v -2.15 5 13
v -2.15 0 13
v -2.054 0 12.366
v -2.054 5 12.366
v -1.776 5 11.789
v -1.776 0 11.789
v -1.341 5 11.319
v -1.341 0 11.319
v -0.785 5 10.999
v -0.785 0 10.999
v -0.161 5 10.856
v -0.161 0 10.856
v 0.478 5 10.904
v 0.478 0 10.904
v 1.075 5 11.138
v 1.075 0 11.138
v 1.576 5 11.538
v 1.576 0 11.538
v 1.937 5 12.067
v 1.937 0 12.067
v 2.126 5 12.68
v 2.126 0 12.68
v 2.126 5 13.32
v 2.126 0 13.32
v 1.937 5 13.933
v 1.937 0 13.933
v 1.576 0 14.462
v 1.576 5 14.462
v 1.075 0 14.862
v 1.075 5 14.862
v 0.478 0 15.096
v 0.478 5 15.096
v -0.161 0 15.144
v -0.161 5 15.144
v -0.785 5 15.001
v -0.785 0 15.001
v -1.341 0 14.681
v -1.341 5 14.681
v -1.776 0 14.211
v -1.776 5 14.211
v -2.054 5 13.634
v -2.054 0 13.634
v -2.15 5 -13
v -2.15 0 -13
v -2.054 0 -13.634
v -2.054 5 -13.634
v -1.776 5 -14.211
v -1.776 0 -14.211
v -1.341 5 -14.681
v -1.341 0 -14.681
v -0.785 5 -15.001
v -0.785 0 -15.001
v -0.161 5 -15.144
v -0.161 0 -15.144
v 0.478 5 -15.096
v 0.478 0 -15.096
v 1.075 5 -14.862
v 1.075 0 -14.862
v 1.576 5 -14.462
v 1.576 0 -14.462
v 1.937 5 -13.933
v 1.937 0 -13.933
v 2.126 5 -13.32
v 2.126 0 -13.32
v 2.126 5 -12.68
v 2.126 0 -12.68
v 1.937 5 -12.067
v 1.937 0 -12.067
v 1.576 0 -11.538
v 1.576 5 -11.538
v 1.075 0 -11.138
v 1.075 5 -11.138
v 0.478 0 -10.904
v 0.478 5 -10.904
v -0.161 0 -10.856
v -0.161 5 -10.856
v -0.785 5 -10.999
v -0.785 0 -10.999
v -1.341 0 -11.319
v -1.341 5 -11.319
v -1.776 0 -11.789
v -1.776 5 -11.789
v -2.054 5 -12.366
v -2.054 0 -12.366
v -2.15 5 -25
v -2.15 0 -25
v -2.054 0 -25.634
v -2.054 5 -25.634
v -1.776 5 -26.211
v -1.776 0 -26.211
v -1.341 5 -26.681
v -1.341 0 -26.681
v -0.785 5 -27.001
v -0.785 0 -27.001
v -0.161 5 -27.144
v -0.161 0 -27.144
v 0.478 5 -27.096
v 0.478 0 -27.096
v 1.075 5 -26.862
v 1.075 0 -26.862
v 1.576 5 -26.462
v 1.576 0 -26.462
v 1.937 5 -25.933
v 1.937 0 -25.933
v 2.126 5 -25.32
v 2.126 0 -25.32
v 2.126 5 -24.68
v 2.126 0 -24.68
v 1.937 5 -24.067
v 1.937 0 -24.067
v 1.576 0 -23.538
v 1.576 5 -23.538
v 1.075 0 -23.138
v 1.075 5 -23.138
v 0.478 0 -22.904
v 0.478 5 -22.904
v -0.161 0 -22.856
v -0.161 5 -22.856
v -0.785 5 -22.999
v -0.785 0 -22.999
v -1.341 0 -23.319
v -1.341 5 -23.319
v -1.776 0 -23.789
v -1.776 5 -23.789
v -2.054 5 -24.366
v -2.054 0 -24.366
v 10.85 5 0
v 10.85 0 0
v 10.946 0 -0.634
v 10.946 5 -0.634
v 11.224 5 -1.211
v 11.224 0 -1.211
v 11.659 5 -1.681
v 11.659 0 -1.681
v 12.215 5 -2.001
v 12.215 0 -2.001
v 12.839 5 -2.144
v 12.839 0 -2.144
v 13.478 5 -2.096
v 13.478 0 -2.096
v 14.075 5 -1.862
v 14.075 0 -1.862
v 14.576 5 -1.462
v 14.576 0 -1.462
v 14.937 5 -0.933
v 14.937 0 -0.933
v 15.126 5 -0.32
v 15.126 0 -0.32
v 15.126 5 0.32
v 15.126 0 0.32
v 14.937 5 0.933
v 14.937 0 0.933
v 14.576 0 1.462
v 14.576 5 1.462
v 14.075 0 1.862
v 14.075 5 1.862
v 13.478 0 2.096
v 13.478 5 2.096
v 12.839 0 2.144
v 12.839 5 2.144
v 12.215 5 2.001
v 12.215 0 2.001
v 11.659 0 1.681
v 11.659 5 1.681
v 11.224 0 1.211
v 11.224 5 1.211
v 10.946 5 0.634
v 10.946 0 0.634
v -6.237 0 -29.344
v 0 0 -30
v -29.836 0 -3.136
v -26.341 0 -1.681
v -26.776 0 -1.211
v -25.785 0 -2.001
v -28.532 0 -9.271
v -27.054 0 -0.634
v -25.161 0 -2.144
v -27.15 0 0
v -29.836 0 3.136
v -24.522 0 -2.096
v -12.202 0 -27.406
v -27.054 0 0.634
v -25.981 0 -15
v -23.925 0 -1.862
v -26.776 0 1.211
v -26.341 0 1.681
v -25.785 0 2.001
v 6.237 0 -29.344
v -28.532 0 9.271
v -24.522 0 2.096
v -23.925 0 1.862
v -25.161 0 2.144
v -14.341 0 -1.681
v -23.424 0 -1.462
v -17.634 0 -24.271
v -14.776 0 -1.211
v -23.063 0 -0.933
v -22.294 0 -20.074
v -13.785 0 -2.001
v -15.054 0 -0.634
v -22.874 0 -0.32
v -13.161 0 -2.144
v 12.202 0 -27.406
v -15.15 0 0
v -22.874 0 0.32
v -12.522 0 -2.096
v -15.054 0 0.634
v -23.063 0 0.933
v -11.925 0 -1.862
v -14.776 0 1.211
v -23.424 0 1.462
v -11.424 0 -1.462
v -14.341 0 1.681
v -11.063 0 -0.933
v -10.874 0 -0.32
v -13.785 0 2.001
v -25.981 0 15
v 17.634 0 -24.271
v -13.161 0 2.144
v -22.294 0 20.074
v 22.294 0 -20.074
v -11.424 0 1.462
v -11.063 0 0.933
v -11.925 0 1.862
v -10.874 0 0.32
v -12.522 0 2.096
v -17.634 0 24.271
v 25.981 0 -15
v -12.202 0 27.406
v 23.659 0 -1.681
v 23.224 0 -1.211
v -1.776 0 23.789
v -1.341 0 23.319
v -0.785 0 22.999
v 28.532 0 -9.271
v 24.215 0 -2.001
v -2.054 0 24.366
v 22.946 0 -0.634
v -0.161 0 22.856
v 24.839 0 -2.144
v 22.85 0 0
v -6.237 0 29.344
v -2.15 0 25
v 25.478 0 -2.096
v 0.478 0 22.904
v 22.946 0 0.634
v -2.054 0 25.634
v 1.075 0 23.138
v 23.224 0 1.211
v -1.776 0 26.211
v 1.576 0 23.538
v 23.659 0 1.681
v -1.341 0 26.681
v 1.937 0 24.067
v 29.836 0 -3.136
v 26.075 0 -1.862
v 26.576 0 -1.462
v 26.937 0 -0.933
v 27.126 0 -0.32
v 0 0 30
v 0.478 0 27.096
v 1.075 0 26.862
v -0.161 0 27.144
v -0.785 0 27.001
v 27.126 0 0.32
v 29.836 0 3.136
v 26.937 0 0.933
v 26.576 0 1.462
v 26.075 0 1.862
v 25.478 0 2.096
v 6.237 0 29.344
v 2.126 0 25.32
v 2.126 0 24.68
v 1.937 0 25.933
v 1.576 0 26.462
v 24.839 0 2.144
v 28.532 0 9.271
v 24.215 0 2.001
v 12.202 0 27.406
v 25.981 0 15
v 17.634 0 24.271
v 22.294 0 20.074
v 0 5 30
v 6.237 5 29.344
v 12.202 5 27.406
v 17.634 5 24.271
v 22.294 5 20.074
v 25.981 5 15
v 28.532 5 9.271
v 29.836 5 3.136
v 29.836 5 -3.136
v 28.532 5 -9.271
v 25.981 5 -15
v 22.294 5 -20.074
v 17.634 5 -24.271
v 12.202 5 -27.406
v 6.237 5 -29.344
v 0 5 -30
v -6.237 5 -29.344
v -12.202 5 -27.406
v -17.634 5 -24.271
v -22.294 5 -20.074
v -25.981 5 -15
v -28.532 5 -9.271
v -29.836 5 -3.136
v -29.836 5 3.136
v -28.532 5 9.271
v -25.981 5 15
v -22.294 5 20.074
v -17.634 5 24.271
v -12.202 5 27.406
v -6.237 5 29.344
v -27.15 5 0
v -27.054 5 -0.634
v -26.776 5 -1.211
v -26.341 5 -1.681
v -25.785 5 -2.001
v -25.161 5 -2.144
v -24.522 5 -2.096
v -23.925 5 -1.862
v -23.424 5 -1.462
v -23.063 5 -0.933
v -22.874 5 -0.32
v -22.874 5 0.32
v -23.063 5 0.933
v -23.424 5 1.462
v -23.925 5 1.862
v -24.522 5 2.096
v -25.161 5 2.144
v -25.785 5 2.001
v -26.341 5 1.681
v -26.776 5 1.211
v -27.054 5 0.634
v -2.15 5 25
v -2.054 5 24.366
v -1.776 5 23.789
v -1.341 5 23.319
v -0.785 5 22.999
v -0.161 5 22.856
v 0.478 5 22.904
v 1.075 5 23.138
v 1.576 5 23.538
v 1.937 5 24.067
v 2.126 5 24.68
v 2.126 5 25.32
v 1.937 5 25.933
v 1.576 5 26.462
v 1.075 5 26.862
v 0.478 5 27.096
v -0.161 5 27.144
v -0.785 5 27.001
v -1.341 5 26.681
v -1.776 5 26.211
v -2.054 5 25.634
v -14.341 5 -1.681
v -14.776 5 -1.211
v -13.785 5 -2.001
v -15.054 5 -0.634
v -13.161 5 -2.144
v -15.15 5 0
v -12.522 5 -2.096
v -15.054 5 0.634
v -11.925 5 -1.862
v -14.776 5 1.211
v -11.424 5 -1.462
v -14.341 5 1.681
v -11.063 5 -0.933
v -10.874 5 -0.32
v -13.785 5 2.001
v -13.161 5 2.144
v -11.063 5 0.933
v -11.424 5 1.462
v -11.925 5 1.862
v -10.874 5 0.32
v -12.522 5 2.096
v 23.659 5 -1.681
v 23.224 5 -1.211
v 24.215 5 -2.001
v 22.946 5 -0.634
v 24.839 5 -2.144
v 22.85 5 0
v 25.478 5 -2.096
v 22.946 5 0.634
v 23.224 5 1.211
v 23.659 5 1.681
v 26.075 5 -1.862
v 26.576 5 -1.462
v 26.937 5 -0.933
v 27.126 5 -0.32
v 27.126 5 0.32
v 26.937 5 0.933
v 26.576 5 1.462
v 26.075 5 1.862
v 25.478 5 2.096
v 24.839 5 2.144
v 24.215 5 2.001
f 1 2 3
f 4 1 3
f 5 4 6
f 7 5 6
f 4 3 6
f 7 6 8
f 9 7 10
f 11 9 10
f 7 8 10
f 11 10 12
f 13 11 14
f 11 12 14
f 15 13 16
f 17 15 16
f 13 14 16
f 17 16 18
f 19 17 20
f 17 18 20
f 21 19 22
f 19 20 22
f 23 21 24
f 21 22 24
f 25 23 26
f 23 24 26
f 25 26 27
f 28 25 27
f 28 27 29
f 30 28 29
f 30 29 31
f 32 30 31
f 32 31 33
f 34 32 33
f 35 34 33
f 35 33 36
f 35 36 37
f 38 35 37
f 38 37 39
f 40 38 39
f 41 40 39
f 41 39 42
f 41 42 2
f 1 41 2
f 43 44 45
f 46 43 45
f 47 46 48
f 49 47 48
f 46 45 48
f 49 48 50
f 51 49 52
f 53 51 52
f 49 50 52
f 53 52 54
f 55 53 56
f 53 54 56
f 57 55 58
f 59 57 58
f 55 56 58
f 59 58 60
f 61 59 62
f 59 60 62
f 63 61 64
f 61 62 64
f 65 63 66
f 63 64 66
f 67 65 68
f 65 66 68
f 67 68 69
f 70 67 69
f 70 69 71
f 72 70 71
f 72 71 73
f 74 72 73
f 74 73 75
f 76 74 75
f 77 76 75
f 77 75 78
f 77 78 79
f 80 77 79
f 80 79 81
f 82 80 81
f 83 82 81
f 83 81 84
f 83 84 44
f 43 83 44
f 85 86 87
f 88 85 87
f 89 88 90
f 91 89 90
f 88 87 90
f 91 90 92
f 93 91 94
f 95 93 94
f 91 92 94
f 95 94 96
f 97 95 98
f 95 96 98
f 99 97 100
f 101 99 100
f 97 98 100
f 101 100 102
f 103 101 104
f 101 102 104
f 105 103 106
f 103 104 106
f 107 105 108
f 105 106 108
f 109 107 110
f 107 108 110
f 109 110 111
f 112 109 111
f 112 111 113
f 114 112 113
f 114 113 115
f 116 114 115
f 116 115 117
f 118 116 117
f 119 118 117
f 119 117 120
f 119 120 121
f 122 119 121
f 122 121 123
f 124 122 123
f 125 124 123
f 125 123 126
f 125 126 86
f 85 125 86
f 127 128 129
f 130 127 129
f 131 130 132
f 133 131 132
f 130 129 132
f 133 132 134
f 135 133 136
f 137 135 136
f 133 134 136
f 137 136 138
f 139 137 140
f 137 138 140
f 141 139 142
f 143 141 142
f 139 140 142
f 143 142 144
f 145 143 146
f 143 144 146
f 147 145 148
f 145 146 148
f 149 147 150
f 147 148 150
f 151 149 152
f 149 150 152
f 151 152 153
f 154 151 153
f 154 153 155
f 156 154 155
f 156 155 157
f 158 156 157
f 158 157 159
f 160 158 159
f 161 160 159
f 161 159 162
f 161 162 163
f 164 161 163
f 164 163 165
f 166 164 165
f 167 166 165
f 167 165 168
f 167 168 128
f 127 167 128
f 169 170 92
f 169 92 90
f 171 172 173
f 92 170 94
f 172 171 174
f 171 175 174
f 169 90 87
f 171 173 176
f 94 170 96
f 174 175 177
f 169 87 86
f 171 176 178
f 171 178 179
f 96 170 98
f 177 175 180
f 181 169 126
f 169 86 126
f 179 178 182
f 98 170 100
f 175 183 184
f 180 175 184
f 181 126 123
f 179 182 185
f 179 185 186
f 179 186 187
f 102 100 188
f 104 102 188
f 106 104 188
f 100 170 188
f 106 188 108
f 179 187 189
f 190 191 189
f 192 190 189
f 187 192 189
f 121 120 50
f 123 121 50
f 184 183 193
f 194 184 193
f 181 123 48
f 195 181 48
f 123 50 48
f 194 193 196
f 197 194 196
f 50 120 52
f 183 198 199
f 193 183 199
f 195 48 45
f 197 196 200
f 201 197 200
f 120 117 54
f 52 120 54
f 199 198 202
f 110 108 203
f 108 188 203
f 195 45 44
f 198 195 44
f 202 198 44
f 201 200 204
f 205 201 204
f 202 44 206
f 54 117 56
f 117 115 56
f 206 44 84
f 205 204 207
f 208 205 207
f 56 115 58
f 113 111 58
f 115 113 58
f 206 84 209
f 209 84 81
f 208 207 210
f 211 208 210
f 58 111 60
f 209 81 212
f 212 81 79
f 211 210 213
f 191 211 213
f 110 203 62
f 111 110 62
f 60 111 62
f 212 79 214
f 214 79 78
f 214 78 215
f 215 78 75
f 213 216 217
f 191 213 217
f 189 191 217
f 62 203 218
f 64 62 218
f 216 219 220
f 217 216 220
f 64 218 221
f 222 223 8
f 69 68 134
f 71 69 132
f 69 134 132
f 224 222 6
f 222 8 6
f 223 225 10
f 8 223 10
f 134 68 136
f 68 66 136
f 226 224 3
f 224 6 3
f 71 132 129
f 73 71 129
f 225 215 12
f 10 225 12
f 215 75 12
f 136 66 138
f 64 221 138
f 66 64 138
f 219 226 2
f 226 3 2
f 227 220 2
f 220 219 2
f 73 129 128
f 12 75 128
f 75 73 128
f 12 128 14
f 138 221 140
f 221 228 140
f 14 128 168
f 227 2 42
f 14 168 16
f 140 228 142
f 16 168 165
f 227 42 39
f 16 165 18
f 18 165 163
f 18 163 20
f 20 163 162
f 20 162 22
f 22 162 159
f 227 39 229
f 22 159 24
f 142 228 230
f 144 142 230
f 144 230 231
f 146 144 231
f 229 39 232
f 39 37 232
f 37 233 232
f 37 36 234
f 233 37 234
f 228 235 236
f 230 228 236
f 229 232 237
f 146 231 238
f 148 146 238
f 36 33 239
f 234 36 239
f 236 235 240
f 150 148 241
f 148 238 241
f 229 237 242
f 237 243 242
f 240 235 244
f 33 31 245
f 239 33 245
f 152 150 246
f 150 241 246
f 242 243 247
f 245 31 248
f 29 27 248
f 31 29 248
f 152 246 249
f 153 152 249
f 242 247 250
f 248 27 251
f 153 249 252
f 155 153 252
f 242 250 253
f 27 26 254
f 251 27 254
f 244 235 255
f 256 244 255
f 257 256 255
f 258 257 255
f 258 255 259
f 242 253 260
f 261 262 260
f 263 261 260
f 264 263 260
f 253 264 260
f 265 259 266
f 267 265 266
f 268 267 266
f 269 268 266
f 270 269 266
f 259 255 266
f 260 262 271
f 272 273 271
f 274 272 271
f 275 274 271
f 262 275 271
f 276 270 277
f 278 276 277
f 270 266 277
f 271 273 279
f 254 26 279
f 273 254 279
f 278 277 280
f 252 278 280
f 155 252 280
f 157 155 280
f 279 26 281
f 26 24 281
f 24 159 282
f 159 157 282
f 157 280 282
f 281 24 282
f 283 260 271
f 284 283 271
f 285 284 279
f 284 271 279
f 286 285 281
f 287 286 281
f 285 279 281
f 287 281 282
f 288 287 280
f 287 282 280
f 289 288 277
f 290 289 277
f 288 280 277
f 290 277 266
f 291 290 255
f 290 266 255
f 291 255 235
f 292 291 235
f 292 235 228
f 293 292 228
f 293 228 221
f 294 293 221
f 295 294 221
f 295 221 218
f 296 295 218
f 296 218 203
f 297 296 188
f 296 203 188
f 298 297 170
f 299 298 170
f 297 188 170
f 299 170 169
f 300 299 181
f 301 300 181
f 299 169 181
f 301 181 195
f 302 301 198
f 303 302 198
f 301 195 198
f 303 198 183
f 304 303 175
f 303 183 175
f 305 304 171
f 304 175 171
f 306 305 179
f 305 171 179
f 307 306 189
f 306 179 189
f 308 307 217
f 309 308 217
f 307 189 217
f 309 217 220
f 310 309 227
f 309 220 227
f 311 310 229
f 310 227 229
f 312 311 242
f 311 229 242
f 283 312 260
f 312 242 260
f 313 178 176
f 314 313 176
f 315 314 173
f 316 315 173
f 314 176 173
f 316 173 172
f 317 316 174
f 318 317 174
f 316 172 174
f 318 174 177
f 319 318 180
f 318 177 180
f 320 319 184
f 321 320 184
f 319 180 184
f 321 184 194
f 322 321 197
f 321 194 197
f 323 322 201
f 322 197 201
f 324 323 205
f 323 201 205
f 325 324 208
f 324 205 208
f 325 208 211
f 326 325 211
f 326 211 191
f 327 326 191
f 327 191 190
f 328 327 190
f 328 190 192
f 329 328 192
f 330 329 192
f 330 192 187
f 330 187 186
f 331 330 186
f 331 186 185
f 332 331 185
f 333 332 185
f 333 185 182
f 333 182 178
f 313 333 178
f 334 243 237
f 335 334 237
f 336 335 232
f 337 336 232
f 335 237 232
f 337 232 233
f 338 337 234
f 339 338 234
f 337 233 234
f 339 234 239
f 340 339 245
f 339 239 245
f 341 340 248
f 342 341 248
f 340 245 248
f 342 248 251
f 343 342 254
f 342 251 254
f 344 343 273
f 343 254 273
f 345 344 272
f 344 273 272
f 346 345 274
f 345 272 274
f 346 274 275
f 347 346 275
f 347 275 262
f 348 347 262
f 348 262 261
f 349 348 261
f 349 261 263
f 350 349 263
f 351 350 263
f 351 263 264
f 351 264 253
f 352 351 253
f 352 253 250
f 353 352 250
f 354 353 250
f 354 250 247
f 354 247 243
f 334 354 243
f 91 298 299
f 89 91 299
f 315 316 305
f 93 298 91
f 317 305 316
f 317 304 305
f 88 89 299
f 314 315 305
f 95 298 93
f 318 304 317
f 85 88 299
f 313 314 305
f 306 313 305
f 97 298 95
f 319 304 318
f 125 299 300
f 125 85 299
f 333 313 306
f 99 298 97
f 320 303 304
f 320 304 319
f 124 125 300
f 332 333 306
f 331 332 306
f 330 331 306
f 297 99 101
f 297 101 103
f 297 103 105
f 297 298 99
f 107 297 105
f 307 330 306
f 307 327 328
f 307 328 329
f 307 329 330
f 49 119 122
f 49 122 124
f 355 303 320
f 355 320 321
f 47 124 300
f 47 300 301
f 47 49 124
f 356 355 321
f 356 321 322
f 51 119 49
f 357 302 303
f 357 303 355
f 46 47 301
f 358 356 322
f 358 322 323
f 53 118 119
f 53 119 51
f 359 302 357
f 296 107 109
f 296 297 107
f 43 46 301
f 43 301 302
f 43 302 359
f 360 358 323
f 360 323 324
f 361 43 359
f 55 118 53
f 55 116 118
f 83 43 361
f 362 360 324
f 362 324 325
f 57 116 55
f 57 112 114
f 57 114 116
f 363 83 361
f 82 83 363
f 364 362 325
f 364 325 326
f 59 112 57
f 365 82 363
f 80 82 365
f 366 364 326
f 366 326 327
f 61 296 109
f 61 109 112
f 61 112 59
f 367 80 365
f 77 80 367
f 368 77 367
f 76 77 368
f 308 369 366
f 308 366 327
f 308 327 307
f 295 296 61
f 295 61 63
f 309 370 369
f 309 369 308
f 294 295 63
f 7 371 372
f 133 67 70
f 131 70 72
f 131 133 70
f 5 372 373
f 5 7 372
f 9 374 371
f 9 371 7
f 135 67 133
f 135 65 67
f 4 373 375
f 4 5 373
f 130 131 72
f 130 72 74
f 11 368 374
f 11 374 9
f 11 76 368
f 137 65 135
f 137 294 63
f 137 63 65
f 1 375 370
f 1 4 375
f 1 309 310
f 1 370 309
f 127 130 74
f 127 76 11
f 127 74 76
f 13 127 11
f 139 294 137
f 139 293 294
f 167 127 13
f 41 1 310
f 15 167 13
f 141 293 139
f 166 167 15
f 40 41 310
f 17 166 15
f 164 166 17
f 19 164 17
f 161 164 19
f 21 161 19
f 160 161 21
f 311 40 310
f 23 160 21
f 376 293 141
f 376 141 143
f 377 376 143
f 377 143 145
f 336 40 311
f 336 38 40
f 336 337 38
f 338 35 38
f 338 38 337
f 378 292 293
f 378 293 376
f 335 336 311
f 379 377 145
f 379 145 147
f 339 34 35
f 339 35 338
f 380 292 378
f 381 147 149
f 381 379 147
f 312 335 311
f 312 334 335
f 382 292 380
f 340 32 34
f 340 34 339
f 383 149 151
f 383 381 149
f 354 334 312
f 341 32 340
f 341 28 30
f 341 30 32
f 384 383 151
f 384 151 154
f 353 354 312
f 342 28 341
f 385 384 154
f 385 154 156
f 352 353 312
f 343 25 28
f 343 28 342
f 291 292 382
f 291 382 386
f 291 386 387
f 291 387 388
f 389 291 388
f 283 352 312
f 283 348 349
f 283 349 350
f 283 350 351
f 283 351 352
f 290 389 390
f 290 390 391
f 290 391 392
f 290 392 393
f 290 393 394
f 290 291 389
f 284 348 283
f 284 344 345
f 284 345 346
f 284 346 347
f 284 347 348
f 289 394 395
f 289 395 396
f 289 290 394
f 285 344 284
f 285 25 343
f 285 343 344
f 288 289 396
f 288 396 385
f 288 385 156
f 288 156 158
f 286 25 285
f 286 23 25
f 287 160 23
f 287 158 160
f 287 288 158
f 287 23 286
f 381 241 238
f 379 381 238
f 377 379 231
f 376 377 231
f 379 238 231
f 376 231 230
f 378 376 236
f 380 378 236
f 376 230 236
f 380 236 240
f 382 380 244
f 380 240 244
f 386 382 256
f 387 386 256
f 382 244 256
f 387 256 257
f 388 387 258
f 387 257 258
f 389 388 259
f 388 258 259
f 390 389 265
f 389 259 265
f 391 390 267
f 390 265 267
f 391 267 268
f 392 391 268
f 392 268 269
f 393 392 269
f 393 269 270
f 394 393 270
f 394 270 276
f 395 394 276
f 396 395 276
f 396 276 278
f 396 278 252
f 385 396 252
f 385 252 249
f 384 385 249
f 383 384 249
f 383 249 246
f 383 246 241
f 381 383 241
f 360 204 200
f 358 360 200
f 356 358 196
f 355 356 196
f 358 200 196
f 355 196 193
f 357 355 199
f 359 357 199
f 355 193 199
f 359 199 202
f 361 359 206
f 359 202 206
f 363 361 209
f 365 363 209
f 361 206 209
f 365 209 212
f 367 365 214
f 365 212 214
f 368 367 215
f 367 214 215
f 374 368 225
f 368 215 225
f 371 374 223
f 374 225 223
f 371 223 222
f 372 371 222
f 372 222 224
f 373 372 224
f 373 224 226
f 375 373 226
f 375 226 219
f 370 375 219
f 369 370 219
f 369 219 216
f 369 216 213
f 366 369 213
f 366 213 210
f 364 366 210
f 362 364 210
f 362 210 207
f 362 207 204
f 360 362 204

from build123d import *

# Parameters (mm, degrees)
SKETCH1_R            = 30
BOSS_EXTRUDE1_DEPTH  = 5
M4_CLEARANCE_HOLE1_D = 4.3
M4_CLEARANCE_HOLE2_D = 4.3


with BuildPart() as part:
    # Sketch1 → Boss-Extrude1 (new body)
    with BuildSketch(Plane(origin=(0, 0, 0), x_dir=(1, 0, 0), z_dir=(0, 1, 0))):
        with Locations(Location((0, 0, 0), (0, 0, 270))):
            Circle(SKETCH1_R)
    extrude(amount=BOSS_EXTRUDE1_DEPTH)

    # M4 Clearance Hole1 (through all)
    with Locations(Plane(origin=(0, 5, 0), x_dir=(1, 0, 0), z_dir=(0, 1, 0))):
        with Locations((0, -25), (-25, 0), (25, 0), (0, 25)):
            Hole(M4_CLEARANCE_HOLE1_D / 2)

    # M4 Clearance Hole2 (through all)
    with Locations(Plane(origin=(0, 5, 0), x_dir=(1, 0, 0), z_dir=(0, 1, 0))):
        with Locations((-13, 0), (13, 0), (0, 13), (0, -13)):
            Hole(M4_CLEARANCE_HOLE2_D / 2)


solid = part.part
